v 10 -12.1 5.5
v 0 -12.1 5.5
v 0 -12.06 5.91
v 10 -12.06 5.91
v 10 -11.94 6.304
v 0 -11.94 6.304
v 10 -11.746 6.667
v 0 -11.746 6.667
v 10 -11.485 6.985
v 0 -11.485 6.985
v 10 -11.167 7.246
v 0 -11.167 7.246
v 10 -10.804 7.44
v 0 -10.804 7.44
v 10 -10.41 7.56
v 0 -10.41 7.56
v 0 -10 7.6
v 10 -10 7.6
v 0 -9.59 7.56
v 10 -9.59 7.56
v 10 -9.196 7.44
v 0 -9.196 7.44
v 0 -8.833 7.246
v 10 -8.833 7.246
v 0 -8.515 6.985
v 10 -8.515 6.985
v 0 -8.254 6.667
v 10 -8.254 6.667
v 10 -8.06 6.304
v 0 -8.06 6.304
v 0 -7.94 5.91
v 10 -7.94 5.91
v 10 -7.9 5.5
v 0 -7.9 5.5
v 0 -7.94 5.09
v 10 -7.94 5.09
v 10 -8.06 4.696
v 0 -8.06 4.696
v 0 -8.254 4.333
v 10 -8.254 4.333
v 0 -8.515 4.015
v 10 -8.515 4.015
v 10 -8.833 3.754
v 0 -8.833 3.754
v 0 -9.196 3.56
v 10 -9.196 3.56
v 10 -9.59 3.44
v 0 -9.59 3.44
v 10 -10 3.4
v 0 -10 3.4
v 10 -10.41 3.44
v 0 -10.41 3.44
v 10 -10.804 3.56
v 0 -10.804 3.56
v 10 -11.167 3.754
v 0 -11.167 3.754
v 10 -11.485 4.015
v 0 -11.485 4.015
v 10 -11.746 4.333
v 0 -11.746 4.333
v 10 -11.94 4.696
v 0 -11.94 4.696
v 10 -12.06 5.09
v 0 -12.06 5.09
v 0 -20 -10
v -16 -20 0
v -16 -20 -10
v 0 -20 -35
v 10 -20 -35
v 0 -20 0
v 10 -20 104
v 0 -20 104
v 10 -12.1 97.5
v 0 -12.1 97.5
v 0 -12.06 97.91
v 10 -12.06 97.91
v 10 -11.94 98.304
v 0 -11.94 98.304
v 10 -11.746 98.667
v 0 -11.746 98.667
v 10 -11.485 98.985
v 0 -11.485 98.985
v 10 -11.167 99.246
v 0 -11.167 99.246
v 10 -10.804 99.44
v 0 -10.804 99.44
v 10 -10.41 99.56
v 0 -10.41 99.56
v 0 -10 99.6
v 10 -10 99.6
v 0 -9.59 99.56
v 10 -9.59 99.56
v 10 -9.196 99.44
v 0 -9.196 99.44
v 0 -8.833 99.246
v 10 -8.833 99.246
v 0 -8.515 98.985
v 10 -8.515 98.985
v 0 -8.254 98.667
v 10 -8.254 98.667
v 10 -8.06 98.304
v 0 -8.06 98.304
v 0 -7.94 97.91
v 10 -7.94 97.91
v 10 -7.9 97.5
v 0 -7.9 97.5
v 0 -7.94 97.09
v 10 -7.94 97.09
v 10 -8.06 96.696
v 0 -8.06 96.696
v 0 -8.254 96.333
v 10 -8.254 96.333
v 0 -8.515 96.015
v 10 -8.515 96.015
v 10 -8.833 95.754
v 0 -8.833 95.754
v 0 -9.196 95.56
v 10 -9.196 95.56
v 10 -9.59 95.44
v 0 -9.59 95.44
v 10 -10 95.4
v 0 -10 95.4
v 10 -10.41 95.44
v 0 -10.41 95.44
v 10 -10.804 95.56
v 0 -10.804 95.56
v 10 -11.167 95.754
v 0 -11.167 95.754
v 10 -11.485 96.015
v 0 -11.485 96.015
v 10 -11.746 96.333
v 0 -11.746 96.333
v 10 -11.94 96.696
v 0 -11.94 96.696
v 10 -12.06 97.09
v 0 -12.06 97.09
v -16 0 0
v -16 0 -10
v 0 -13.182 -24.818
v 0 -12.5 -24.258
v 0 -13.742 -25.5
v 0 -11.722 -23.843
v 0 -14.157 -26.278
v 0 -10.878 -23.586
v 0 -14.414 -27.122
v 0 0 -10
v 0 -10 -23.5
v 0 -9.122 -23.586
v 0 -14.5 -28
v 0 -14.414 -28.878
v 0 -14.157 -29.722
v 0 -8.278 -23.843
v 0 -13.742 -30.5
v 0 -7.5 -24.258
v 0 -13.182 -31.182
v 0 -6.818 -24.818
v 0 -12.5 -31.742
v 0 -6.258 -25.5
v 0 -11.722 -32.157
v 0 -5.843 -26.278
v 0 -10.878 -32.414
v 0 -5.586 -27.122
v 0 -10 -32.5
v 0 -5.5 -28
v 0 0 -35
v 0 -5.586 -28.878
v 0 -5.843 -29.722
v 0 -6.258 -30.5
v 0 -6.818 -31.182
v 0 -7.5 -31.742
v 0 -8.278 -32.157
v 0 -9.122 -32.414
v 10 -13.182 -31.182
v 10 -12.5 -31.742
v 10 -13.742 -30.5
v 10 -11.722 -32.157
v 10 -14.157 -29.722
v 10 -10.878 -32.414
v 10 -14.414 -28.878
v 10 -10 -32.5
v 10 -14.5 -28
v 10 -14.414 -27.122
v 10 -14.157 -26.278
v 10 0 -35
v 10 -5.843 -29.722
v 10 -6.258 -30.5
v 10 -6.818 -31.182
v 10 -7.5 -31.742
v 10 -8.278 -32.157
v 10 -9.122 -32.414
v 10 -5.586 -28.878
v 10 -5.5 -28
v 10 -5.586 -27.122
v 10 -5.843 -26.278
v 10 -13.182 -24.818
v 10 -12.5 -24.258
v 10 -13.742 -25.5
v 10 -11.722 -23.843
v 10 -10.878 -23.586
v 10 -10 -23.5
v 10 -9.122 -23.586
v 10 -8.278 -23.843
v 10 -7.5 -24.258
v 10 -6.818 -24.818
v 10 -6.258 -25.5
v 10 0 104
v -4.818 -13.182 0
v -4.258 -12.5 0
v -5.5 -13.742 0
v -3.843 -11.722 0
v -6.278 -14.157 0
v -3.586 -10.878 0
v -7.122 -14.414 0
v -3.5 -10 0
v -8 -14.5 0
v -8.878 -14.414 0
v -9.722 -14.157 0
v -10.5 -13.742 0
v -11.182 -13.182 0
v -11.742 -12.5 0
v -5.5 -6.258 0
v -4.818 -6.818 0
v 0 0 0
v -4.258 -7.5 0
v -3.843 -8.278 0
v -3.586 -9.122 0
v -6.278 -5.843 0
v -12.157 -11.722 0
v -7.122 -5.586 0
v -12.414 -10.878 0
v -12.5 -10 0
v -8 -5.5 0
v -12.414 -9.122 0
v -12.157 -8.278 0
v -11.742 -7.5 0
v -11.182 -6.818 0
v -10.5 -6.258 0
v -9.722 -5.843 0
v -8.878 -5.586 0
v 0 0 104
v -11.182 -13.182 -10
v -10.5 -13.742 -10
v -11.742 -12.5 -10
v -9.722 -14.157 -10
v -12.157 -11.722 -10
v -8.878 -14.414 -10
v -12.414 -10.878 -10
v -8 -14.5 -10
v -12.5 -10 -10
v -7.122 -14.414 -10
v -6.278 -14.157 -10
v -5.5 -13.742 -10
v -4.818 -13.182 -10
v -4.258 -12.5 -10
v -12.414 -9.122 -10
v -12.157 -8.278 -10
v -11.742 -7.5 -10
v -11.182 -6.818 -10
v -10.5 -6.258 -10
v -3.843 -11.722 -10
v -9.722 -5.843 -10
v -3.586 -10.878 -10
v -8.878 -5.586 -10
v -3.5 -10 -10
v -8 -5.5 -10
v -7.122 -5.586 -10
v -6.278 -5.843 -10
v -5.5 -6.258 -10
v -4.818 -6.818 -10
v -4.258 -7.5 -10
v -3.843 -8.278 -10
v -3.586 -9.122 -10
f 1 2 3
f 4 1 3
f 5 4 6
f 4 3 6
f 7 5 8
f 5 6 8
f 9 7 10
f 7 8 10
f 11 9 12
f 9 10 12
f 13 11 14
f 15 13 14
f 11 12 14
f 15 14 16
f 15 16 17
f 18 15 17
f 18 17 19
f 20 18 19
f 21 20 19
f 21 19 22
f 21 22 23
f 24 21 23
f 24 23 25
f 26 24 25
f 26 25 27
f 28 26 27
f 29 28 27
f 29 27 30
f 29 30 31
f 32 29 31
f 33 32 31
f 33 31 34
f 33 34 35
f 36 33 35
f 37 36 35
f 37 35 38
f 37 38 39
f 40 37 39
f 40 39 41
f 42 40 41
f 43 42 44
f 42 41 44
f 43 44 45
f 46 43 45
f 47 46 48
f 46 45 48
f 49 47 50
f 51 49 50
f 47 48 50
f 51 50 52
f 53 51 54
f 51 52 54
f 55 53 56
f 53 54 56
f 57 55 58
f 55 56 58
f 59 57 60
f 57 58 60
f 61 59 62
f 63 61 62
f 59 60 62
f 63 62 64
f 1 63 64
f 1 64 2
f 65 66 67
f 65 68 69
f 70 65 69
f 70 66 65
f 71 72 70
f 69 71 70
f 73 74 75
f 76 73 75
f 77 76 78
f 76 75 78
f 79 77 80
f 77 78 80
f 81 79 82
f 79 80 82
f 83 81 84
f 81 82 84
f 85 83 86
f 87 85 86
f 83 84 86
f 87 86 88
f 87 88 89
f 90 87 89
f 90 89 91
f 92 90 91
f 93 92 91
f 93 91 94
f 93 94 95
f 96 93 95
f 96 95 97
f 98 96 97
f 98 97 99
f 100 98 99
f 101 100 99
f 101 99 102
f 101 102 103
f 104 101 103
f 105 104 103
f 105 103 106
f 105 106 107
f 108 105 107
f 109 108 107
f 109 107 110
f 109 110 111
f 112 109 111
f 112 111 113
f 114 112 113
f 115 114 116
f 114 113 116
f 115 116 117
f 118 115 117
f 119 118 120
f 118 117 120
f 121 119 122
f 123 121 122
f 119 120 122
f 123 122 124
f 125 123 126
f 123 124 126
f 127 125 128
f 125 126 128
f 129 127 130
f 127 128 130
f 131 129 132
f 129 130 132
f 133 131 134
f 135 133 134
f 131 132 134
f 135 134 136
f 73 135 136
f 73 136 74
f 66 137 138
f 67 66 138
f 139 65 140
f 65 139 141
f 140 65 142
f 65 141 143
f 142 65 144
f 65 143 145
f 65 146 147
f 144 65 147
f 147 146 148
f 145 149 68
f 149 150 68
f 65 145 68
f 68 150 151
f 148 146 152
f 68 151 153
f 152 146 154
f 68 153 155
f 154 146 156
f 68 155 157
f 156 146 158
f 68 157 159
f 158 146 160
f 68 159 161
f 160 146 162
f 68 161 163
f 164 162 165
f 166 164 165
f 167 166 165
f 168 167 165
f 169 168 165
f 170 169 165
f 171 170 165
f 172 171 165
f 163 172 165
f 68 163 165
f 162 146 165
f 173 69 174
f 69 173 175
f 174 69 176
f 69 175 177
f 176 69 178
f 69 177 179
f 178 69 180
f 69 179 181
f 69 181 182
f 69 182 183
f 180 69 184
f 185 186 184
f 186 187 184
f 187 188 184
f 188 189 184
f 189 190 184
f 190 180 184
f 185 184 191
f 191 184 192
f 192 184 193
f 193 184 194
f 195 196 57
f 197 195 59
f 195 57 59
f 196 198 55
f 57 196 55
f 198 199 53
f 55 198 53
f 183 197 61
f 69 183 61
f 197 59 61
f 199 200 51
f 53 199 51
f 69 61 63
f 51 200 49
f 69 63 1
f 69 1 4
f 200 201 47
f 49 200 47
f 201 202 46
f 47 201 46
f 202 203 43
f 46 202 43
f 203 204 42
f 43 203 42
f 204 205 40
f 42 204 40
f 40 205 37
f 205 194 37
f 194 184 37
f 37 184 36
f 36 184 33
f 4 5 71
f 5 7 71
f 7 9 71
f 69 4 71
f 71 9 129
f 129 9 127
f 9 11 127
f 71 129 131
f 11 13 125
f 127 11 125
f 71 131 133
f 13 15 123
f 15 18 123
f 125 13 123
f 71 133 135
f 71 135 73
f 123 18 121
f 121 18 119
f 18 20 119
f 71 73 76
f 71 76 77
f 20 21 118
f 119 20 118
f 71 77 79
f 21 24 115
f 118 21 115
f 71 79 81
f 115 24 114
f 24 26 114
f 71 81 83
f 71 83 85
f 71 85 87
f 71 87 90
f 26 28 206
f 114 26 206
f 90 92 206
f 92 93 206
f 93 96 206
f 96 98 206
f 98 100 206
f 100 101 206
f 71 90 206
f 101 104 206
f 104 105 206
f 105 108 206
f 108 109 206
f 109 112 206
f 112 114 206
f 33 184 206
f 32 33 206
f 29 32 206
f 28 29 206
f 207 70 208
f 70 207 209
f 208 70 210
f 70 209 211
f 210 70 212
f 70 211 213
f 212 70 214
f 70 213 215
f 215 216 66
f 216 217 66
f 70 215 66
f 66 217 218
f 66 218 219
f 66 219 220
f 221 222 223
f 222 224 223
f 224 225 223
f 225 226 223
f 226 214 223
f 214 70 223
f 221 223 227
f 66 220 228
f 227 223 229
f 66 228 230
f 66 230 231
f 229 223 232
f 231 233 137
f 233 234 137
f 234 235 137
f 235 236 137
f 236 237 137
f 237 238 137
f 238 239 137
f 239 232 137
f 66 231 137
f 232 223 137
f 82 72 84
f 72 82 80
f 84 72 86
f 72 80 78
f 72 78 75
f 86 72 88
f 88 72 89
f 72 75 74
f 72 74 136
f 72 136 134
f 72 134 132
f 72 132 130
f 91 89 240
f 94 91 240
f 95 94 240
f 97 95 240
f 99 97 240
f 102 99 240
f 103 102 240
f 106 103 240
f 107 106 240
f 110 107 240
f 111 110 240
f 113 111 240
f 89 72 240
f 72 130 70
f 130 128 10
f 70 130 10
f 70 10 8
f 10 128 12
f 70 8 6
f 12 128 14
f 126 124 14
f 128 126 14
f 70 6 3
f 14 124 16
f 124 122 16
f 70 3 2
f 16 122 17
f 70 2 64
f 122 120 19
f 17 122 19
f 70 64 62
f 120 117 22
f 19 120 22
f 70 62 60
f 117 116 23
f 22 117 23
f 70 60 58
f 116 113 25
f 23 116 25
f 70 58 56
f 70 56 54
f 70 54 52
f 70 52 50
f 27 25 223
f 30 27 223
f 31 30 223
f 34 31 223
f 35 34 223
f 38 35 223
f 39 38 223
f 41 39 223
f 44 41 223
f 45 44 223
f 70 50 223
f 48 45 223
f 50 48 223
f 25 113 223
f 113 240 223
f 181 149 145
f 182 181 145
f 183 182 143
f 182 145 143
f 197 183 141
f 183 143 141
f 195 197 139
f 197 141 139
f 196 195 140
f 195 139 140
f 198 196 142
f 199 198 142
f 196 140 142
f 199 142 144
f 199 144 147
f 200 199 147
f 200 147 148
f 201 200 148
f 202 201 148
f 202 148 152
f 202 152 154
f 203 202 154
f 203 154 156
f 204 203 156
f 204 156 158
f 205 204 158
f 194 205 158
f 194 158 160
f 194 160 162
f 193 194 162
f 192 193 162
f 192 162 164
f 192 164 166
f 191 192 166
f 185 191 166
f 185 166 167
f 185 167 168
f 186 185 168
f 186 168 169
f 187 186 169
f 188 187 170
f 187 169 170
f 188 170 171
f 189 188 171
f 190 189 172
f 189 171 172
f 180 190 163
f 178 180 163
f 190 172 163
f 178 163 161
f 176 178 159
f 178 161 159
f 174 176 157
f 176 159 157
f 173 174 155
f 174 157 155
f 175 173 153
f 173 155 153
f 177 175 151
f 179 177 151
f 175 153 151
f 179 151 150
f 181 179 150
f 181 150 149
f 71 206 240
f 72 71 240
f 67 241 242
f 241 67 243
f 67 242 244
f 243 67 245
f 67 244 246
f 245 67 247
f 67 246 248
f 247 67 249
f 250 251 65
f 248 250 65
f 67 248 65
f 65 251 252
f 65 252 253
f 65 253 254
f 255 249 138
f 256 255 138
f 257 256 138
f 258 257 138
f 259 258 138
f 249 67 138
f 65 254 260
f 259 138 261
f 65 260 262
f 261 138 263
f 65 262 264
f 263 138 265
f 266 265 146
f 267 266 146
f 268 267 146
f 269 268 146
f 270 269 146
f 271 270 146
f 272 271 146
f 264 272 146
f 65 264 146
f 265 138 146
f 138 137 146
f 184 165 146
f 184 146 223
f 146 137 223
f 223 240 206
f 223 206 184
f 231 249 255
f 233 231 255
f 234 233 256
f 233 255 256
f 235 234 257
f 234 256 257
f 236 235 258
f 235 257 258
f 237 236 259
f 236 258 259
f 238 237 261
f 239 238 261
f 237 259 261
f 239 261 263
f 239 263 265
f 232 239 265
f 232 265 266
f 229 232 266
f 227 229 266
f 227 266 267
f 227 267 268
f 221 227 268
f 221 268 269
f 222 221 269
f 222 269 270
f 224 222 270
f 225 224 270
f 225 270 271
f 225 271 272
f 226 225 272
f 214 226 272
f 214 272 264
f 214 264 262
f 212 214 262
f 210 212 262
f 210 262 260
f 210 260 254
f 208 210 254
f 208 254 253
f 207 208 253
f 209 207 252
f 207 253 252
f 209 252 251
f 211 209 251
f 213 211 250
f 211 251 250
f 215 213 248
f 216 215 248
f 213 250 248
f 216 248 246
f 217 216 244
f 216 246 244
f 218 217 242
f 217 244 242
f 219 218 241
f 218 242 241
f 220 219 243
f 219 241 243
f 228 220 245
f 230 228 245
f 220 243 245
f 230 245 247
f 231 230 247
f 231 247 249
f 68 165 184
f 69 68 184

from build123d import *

# Parameters (mm, degrees)
F1_DEPTH = 20
F3_D     = 9
F5_D     = 9
F7_D     = 4.2


with BuildPart() as f1:
    # F0 (on Front) → F1 (new body)
    with BuildSketch(Plane.XZ):
        Polygon((0, 104), (0, 0), (-16, 0), (-16, -10), (0, -10), (0, -35), (10, -35), (10, 104), align=None)
    extrude(amount=F1_DEPTH)

    # F3 (through all)
    with Locations(Plane.XY):
        with Locations((-8, -10)):
            Hole(F3_D / 2)

    # F5 (through all)
    with Locations(Plane.YZ.offset(10)):
        with Locations((-10, -28)):
            Hole(F5_D / 2)

    # F7 (through all)
    with Locations(Plane.YZ.offset(10)):
        with Locations((-10, 97.5), (-10, 5.5)):
            Hole(F7_D / 2)


solid = f1.part
